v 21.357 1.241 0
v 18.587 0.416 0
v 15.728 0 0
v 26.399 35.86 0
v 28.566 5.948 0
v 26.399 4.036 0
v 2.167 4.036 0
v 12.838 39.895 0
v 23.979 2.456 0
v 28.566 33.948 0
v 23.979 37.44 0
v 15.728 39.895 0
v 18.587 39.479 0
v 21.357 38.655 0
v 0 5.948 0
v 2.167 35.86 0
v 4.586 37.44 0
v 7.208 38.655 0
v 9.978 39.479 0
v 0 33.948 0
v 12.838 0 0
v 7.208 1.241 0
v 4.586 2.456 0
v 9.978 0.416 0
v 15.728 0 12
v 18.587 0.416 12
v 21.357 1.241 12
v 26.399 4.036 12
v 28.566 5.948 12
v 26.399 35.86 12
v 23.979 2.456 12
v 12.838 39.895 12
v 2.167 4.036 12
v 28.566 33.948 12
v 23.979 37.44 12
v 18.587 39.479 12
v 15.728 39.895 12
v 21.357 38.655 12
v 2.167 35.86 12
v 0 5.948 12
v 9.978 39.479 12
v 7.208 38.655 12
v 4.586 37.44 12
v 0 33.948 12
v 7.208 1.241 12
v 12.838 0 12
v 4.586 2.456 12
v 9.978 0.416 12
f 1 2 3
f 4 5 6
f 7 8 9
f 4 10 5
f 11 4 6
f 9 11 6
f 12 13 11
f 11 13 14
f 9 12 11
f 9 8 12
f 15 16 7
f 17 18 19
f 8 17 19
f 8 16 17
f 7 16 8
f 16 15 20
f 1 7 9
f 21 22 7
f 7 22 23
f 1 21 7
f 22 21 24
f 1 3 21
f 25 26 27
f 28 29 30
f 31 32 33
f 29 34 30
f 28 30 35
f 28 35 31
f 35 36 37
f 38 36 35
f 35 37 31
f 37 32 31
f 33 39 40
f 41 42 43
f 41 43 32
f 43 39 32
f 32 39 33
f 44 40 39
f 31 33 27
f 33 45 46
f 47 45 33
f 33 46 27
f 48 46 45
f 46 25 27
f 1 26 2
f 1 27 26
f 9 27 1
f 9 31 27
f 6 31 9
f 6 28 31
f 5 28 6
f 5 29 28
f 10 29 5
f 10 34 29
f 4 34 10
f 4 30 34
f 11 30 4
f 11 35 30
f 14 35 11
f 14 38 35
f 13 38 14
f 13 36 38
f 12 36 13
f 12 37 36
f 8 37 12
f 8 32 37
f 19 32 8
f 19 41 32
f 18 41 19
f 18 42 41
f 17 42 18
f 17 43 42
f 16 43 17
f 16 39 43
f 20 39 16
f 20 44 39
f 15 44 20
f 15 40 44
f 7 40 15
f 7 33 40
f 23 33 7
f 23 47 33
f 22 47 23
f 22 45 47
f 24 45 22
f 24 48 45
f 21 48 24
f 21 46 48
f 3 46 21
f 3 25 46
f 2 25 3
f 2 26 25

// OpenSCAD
$fn = 32;
// ----------------------------------------------------------------------
// Eccentric disc: double_d, 12 mm thick
// ----------------------------------------------------------------------

// --- parameters (mm) ---
profile_height = 12;      // extrusion height
profile_points = 24;      // points of the closed outline

profile = [[28.566, 33.948], [26.399, 35.86], [23.979, 37.44], [21.357, 38.655], [18.587, 39.479], [15.728, 39.895], [12.838, 39.895], [9.978, 39.479], [7.208, 38.655], [4.586, 37.44], [2.167, 35.86], [0, 33.948], [0, 5.948], [2.167, 4.036], [4.586, 2.456], [7.208, 1.241], [9.978, 0.416], [12.838, 0], [15.728, 0], [18.587, 0.416], [21.357, 1.241], [23.979, 2.456], [26.399, 4.036], [28.566, 5.948]];  // single closed polygon, 24 points, counter clockwise

// --- the one profile operation ---
linear_extrude(height = profile_height) polygon(points = profile);
